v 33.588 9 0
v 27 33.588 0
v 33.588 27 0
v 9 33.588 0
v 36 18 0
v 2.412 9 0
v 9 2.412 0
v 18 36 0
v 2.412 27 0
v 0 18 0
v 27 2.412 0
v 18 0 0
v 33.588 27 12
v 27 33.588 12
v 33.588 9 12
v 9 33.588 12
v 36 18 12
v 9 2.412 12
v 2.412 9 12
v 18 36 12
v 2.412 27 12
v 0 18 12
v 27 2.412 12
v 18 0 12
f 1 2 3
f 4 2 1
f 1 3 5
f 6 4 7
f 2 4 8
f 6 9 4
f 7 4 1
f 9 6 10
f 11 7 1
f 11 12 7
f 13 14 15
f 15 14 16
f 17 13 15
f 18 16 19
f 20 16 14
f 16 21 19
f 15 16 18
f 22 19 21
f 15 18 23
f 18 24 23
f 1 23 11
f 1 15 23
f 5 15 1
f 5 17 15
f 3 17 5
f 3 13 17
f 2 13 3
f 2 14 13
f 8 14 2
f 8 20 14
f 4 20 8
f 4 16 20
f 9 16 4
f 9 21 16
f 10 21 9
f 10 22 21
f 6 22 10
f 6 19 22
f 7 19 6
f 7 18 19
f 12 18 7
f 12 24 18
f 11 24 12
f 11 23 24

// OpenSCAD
$fn = 32;

// ----------------------------------------------------------------------
// Flat adaptor: keyed, 12 mm thick
// ----------------------------------------------------------------------

// --- parameters (mm) ---
profile_height = 12;      // extrusion height
profile_points = 12;      // points of the closed outline

profile = [[0, 18], [2.412, 9], [9, 2.412], [18, 0], [27, 2.412], [33.588, 9], [36, 18], [33.588, 27], [27, 33.588], [18, 36], [9, 33.588], [2.412, 27]];  // single closed polygon, 12 points, counter clockwise

// --- the one profile operation ---
linear_extrude(height = profile_height) polygon(points = profile);
